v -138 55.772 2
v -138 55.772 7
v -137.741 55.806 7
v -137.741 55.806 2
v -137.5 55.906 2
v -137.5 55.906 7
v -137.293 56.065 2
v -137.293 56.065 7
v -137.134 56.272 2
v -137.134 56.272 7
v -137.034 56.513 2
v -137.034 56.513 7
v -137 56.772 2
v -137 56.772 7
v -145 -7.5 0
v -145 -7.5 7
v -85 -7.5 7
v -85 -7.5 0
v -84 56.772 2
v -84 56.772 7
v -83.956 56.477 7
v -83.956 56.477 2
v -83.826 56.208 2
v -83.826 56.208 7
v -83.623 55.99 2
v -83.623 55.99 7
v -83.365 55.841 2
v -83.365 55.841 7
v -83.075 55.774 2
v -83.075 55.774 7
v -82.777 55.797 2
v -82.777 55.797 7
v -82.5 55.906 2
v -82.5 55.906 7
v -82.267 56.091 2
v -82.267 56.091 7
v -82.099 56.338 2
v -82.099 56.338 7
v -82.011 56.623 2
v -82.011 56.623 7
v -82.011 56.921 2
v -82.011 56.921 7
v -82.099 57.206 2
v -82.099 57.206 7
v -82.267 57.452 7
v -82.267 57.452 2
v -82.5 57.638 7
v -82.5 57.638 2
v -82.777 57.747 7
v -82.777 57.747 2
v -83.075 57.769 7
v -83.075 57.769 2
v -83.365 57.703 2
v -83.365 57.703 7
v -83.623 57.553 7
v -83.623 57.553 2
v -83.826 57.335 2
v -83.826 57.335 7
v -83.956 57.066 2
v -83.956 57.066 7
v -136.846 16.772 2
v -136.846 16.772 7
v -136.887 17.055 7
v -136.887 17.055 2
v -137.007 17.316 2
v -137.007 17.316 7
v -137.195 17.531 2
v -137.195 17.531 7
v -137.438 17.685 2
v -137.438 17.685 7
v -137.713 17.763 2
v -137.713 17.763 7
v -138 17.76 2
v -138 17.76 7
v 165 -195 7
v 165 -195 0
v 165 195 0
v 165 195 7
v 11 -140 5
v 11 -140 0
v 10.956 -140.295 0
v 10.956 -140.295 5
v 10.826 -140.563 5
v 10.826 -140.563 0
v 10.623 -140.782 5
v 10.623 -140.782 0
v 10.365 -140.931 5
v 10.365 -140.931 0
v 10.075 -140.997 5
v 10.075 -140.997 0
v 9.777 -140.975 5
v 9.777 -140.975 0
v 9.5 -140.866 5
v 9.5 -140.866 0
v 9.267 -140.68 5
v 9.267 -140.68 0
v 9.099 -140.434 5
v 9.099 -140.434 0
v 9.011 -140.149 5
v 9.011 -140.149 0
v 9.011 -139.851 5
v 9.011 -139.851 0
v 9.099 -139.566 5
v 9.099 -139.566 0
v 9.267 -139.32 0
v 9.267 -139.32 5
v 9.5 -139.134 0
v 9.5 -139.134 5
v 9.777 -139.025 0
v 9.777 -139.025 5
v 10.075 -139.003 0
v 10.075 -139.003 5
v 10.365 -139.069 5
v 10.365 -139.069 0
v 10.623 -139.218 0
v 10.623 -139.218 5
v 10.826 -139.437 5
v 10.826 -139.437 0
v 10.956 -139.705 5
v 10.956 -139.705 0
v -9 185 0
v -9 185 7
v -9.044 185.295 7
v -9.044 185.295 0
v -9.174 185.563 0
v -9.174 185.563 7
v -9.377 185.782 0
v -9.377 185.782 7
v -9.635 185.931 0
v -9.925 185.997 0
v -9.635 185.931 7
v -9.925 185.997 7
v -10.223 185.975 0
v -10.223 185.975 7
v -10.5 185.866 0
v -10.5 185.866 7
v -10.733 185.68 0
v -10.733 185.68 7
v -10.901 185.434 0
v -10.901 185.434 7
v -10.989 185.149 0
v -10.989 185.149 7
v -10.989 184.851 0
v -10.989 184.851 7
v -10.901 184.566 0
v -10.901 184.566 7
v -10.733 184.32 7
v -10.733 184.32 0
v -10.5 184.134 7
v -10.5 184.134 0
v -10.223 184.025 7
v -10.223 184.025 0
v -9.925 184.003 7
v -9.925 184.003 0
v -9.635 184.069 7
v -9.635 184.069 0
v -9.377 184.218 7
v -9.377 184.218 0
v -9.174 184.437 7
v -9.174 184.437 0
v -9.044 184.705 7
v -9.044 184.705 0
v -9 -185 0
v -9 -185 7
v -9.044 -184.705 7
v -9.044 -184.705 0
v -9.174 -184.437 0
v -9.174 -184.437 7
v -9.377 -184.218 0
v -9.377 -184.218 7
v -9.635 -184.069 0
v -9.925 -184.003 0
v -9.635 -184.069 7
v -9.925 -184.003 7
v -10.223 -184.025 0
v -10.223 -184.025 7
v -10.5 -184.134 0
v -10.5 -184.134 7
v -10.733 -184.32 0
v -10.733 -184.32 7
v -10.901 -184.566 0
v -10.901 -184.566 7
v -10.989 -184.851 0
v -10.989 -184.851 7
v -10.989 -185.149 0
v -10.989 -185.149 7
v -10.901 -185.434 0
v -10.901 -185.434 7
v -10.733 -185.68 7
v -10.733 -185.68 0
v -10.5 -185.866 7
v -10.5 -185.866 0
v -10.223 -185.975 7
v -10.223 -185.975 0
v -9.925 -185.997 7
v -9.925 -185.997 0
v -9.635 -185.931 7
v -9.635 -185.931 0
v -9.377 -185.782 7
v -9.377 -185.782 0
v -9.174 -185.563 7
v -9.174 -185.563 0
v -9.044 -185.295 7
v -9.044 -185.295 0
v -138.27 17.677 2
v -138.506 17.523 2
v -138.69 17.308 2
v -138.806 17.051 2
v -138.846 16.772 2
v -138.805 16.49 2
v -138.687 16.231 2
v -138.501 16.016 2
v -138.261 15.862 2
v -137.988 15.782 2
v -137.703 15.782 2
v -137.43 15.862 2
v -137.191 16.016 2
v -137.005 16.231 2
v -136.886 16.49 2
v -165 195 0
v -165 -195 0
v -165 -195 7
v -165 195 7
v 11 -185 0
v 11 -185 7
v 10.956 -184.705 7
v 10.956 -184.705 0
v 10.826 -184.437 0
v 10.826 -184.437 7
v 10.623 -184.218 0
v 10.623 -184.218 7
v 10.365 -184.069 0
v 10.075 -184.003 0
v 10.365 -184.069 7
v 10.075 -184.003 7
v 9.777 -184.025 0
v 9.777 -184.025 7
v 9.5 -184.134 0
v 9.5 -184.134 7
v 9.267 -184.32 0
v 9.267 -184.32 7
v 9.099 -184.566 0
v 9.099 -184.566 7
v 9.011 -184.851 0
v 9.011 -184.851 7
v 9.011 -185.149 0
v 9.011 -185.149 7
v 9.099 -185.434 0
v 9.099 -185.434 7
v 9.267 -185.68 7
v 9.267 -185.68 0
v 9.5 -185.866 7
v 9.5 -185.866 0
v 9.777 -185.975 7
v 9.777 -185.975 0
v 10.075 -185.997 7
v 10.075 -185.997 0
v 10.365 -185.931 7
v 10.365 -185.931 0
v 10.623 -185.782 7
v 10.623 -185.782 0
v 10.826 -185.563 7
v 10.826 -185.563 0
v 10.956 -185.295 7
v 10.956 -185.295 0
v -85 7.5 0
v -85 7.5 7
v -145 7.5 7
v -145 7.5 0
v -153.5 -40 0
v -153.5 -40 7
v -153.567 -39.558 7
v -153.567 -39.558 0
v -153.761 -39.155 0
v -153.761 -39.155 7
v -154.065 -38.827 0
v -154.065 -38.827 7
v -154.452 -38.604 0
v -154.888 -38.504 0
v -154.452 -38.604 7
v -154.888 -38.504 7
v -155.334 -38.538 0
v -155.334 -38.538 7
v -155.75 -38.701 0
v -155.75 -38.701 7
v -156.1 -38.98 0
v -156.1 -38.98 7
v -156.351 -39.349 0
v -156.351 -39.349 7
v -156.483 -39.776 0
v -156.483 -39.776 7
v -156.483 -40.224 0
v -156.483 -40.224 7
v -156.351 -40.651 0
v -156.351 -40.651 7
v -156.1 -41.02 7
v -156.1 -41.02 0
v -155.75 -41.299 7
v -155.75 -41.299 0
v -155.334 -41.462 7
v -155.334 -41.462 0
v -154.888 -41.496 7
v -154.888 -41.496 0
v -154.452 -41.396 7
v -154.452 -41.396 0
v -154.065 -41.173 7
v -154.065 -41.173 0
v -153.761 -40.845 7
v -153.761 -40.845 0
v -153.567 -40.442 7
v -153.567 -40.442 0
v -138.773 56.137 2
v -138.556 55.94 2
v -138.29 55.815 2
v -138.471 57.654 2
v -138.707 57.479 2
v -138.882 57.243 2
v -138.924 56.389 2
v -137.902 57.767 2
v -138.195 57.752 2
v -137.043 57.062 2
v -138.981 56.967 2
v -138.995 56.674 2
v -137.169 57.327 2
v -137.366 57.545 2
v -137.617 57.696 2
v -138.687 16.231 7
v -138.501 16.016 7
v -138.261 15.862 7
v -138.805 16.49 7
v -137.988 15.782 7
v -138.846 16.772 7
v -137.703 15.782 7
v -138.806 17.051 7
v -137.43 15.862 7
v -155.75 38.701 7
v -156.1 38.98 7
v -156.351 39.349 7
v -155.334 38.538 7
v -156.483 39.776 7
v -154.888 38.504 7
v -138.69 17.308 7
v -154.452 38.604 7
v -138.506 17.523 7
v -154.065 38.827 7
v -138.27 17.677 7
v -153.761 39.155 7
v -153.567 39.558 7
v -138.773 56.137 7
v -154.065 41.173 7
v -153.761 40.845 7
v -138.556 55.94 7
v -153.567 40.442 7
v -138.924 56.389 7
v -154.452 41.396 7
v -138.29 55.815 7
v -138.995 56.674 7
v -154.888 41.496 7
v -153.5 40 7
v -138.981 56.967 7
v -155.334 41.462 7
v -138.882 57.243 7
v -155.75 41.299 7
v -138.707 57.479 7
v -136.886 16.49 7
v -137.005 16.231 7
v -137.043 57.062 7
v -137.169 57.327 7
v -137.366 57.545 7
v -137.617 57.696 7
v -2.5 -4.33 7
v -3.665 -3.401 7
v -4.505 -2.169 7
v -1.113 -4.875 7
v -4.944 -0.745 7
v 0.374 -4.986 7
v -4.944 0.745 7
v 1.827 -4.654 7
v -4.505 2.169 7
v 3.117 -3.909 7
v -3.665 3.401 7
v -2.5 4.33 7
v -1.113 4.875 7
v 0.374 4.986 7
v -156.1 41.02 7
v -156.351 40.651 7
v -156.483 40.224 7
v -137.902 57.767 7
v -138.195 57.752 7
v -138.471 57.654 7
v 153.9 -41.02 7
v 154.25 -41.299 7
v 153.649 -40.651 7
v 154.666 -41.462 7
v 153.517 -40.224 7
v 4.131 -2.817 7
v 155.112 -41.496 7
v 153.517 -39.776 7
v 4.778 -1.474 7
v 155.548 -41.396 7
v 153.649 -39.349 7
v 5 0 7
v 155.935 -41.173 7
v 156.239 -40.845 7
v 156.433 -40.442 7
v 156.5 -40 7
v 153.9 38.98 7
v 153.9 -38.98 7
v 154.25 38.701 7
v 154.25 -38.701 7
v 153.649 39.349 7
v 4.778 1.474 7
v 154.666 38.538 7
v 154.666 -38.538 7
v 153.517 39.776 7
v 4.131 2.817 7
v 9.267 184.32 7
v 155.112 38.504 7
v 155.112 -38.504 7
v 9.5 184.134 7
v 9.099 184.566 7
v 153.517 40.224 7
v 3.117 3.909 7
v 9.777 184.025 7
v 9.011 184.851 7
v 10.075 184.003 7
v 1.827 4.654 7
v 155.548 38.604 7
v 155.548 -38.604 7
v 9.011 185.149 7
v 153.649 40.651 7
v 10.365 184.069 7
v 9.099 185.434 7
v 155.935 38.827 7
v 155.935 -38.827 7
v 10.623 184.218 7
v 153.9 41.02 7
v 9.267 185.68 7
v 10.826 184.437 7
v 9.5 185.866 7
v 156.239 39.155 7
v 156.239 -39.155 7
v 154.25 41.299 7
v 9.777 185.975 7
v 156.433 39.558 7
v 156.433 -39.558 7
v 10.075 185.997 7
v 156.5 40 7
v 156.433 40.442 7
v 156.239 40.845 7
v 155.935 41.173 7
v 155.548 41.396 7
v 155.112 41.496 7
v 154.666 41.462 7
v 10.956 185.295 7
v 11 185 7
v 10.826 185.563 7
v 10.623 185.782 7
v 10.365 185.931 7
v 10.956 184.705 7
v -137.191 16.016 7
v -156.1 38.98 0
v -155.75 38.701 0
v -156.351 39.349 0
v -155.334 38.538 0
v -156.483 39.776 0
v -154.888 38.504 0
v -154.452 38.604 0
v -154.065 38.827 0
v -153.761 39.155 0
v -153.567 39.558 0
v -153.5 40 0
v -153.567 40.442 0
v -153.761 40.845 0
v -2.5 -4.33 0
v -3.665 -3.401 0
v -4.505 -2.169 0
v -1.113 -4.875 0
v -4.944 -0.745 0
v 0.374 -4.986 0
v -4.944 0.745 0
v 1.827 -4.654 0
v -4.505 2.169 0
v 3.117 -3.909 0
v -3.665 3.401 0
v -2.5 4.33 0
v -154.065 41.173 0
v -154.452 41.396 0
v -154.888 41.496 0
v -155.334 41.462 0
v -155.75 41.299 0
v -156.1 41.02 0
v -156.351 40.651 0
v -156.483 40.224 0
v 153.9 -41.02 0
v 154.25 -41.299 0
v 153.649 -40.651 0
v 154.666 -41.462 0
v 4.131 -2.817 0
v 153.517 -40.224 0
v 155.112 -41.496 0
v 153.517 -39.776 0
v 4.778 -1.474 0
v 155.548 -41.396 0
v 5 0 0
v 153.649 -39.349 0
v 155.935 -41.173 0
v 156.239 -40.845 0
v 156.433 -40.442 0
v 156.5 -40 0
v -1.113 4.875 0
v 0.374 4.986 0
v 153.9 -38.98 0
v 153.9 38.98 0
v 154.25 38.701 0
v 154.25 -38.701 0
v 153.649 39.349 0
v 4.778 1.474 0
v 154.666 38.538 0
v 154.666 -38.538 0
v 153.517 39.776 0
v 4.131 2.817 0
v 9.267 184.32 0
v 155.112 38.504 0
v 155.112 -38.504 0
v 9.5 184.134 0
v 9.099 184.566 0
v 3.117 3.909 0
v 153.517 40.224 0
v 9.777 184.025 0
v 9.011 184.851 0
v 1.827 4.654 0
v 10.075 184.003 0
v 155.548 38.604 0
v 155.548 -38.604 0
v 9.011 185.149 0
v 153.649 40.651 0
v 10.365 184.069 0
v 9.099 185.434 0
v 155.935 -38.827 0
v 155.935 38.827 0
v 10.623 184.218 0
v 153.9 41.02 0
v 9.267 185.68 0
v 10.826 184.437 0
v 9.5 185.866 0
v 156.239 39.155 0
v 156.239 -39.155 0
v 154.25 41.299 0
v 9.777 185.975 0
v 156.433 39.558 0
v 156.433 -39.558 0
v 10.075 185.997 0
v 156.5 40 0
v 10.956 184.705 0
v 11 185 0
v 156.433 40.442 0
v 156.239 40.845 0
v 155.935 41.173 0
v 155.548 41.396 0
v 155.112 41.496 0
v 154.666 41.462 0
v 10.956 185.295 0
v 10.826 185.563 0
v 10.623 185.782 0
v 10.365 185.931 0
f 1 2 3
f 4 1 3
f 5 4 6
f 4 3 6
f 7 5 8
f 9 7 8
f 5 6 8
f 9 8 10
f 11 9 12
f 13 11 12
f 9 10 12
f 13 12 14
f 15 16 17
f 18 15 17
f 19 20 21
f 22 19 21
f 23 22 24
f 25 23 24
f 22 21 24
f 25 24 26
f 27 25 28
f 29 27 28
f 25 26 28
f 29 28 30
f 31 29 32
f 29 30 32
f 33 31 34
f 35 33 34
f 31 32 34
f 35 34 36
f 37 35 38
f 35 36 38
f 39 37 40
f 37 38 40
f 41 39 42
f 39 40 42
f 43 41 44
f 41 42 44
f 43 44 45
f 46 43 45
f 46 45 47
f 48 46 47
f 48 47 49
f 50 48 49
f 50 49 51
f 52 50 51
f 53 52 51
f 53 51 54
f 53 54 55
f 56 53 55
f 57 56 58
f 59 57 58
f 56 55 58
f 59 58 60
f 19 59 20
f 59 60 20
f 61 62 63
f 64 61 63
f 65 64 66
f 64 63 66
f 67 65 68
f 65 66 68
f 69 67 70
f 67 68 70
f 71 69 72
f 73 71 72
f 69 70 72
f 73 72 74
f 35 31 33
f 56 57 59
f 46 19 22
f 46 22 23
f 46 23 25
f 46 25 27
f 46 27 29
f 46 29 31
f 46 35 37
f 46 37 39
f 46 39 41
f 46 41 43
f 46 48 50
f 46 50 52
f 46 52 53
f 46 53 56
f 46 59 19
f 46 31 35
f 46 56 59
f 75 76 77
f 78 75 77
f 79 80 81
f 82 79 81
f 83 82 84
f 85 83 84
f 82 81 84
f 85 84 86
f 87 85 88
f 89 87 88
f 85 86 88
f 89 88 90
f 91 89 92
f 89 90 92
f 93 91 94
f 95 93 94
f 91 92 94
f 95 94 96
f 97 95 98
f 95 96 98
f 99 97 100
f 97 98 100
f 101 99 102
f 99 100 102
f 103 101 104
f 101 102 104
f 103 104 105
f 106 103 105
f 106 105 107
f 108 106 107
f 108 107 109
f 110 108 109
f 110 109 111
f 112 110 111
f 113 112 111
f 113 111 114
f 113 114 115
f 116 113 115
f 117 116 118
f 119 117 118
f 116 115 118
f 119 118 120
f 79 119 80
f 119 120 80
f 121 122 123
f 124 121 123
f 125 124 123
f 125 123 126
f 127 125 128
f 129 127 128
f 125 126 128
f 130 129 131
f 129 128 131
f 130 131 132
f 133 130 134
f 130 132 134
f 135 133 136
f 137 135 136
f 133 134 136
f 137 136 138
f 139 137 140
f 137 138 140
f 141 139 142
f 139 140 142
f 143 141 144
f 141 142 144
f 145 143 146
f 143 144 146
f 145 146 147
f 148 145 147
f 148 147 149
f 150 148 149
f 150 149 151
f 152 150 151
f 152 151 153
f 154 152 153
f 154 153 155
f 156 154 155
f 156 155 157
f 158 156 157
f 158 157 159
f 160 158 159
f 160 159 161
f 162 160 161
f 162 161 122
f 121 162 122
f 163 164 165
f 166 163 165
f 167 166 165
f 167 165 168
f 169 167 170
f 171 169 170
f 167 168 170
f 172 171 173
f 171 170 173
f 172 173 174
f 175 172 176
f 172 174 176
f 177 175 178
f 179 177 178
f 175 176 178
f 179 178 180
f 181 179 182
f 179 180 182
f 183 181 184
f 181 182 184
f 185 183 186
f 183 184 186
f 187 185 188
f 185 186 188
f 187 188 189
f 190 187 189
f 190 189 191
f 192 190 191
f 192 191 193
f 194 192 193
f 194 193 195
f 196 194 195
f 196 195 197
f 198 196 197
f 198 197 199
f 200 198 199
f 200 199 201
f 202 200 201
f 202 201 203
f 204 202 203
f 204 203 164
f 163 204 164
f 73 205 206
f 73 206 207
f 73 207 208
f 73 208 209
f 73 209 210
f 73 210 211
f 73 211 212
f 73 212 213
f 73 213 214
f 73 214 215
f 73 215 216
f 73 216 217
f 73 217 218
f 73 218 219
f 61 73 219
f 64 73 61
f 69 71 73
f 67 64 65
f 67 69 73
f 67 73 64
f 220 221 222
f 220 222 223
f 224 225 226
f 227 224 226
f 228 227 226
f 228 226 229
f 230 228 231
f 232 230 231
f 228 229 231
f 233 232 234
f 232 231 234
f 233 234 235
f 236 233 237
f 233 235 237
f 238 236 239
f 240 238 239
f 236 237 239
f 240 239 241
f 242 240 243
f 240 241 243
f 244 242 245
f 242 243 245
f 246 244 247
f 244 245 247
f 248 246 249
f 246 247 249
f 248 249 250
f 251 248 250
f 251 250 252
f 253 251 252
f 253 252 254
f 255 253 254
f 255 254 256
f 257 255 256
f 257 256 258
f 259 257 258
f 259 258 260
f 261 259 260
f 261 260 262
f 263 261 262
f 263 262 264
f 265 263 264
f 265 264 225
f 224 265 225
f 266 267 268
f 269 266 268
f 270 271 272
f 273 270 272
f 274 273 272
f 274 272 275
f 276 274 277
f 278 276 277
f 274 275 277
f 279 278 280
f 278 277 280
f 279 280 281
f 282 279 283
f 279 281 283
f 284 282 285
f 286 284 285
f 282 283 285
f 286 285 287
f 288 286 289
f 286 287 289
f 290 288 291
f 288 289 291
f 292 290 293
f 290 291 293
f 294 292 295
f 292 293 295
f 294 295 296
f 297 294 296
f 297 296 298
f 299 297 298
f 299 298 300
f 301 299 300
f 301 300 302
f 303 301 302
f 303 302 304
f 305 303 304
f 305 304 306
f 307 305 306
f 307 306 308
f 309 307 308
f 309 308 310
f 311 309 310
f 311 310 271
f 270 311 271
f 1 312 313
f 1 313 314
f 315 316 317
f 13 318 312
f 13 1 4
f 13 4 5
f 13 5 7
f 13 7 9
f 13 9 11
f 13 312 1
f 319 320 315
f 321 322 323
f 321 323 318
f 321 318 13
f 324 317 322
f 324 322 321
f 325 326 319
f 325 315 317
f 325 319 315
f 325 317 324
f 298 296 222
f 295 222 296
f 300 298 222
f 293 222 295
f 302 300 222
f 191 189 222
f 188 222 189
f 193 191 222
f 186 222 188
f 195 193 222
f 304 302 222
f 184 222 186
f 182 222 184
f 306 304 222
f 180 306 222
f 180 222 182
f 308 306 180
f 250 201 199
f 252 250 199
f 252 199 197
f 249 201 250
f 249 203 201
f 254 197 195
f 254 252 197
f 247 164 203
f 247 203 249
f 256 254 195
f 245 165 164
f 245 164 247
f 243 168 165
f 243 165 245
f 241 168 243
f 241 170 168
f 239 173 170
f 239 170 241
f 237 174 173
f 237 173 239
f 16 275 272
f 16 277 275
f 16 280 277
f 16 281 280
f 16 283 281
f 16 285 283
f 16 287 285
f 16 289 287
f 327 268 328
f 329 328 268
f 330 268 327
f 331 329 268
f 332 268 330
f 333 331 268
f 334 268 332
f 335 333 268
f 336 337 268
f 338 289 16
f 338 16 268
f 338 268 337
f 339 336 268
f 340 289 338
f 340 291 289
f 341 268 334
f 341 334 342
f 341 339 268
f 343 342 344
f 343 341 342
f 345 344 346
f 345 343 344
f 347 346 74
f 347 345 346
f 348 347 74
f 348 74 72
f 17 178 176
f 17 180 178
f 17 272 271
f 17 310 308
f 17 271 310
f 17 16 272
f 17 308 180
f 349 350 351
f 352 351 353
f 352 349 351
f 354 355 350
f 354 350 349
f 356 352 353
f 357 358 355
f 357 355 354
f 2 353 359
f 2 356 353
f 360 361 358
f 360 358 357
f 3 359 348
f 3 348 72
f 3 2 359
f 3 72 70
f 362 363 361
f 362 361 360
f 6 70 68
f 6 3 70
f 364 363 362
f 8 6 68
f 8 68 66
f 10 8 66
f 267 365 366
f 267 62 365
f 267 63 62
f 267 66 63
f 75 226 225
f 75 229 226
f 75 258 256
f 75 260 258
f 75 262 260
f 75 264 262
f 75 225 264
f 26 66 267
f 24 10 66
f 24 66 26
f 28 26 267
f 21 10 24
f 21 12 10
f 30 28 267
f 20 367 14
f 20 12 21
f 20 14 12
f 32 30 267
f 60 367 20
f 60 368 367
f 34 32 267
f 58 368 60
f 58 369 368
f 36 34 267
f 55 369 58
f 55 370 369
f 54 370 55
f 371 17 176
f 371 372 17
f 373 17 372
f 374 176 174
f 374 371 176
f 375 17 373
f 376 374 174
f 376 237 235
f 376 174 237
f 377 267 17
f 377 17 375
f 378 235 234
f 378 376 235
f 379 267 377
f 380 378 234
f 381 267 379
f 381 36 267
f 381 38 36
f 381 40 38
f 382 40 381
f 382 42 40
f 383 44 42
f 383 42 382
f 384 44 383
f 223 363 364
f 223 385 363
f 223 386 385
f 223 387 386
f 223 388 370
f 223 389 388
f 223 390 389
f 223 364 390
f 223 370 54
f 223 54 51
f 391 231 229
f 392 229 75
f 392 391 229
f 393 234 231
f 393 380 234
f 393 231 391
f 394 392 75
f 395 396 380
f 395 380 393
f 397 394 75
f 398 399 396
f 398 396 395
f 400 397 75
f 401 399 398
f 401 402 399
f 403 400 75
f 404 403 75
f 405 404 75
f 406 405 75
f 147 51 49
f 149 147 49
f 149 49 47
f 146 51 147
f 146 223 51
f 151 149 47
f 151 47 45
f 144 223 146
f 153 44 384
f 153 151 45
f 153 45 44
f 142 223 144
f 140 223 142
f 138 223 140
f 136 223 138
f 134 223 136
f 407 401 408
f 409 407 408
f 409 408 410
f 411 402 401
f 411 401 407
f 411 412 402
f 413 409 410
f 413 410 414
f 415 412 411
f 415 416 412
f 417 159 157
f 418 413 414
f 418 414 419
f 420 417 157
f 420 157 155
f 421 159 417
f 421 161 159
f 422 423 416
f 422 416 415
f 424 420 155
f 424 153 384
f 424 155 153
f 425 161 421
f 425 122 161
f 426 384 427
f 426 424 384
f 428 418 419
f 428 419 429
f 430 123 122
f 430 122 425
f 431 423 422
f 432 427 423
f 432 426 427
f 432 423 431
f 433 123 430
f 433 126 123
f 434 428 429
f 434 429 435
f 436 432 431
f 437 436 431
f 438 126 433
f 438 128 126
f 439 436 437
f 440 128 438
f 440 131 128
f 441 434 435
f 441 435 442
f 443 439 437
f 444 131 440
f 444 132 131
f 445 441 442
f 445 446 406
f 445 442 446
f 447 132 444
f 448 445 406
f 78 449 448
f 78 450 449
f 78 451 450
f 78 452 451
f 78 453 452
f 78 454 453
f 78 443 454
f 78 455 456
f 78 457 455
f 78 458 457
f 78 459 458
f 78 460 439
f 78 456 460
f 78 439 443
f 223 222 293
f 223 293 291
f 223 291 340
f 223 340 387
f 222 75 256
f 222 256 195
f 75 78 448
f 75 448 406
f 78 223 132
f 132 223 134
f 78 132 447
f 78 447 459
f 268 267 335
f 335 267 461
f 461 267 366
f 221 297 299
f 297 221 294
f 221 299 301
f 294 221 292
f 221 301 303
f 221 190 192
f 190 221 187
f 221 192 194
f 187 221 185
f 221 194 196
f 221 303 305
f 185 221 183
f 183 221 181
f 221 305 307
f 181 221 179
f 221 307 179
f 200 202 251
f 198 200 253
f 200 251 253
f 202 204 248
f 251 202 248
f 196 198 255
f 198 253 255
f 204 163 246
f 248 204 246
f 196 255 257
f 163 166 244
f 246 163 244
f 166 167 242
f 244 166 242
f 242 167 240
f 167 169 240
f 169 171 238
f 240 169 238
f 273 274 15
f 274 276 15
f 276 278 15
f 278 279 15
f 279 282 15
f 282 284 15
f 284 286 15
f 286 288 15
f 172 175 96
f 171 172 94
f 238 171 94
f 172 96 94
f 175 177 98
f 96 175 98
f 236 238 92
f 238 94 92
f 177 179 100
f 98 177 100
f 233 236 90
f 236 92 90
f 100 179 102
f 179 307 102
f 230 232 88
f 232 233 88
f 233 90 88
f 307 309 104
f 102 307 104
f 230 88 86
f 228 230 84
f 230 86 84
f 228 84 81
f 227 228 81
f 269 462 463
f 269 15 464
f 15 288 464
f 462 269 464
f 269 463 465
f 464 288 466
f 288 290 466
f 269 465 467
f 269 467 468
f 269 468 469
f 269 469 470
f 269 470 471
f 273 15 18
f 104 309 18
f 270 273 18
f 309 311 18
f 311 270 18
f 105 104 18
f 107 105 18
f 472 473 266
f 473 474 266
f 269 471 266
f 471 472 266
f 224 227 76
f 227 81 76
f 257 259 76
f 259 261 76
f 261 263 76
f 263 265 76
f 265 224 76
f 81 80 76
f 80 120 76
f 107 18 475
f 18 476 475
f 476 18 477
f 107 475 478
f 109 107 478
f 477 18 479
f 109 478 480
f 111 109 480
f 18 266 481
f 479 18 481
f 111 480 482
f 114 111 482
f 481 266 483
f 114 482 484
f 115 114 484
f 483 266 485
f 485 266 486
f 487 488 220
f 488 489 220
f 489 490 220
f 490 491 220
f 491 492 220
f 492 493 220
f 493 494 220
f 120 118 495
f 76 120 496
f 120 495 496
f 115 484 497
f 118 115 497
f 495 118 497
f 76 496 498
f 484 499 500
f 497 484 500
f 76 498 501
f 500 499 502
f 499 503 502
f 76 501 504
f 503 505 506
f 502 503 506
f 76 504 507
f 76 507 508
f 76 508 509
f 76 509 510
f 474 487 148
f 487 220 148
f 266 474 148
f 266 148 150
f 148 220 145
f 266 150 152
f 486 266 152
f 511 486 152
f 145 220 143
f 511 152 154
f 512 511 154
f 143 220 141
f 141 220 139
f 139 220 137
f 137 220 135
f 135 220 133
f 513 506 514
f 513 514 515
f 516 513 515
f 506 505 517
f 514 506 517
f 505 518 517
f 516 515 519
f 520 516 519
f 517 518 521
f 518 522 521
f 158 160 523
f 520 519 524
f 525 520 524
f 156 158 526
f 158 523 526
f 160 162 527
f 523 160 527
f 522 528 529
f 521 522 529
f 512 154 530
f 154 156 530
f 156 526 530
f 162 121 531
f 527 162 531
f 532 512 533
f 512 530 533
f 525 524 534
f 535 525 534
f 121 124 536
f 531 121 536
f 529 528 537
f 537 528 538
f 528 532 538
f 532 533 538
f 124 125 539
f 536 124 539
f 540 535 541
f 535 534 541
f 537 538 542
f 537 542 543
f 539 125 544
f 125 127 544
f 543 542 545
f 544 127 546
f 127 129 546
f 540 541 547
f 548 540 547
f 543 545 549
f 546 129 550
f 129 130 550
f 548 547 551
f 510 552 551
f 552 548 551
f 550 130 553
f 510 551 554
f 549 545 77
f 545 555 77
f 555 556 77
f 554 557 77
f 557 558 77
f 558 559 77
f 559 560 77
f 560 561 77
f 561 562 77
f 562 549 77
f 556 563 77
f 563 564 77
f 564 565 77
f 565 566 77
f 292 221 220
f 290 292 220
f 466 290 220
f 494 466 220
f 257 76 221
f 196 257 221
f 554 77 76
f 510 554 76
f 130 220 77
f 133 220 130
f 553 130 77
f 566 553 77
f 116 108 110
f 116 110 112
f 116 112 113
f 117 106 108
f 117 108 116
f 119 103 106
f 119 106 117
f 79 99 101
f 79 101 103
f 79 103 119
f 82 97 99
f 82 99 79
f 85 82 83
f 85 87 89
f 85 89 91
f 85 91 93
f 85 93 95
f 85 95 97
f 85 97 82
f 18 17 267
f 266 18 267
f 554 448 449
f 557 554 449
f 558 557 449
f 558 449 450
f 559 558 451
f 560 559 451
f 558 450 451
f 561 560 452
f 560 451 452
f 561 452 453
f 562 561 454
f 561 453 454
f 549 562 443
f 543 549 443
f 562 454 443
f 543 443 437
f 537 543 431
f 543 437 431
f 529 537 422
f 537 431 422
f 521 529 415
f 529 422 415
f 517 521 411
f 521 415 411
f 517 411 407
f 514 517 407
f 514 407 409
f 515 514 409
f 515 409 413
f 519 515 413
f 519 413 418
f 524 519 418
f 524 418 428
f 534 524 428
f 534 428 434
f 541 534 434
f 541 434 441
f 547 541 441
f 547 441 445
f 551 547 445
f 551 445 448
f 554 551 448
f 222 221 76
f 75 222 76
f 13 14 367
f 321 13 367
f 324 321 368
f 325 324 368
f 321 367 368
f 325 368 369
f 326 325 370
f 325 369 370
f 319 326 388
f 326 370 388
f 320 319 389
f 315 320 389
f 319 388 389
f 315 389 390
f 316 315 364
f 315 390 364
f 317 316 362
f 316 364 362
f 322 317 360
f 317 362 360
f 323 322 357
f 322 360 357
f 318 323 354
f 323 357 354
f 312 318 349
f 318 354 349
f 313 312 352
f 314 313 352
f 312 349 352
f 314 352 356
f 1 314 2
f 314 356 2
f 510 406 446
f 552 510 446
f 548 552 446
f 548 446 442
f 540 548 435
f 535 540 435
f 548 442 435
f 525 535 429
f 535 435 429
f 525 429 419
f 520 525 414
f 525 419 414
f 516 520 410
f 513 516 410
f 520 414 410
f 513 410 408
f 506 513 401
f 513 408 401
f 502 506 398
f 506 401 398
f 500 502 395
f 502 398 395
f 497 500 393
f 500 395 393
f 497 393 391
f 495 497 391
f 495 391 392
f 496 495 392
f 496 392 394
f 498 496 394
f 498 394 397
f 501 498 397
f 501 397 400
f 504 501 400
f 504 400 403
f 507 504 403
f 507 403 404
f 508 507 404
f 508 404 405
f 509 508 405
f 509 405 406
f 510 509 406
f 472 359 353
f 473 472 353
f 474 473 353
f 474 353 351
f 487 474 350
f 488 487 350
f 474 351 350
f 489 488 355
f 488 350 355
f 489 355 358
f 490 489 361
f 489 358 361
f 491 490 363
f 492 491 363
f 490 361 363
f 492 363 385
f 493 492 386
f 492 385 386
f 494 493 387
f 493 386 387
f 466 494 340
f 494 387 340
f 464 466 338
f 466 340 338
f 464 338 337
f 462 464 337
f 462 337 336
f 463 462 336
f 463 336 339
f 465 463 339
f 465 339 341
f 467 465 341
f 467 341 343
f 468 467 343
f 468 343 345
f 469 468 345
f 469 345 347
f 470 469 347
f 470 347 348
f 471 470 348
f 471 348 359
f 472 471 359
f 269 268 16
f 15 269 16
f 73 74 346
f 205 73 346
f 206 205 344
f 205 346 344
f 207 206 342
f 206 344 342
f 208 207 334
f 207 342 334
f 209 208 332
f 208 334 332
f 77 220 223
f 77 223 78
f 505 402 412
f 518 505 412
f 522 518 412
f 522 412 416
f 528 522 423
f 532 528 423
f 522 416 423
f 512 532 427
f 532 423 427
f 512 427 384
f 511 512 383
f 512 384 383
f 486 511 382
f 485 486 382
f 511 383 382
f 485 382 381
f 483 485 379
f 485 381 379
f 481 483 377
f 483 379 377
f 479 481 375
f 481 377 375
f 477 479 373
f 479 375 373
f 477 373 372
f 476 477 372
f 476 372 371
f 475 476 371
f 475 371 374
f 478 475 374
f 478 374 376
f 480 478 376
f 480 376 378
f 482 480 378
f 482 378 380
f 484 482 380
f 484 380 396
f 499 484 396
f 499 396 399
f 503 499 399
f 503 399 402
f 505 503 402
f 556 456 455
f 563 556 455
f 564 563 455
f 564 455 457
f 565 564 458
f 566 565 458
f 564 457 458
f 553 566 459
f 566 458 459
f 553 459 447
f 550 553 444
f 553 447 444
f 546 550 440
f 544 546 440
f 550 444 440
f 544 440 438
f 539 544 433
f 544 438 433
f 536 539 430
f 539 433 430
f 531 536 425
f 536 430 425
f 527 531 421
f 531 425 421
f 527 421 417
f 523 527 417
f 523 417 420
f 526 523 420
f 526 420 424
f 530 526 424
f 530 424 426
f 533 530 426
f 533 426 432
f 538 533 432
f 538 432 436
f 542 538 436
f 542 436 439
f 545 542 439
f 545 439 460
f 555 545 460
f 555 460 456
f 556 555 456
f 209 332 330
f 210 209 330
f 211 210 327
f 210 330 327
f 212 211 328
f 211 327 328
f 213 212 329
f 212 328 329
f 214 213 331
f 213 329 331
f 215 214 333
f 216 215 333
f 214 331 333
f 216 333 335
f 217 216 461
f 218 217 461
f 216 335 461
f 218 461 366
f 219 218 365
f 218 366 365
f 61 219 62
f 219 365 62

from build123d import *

# Parameters (mm, degrees)
F0_W      = 330
F0_H      = 390
F1_DEPTH  = 7
F2_R      = 1.5
F3_DEPTH  = 25
F4_R      = 1.5
F5_DEPTH  = 25
F7_DEPTH  = 5
F9_DEPTH  = 25
F10_R     = 5
F11_DEPTH = 25
F12_R     = 1
F13_DEPTH = 50
F14_R     = 1
F15_DEPTH = 5


with BuildPart() as f1:
    # F0 (on Top) → F1 (new body)
    with BuildSketch(Plane.XY):
        Rectangle(F0_W, F0_H)
    extrude(amount=F1_DEPTH)

    # F2 (on face) → F3 (cut)
    with BuildSketch(Plane.XY.offset(7)):
        with Locations((-155, 40)):
            Circle(F2_R)
        with Locations((-155, -40)):
            Circle(F2_R)
    extrude(amount=-F3_DEPTH, mode=Mode.SUBTRACT)

    # F4 (on face) → F5 (cut)
    with BuildSketch(Plane.XY.offset(7)):
        with Locations((155, 40)):
            Circle(F4_R)
        with Locations((155, -40)):
            Circle(F4_R)
    extrude(amount=-F5_DEPTH, mode=Mode.SUBTRACT)

    # F6 (on face) → F7 (cut)
    with BuildSketch(Plane.XY.offset(7)):
        with BuildLine():
            Line((-138, 56.771628), (-137, 56.771628))
            ThreePointArc((-137, 56.771628), (-138.707107, 57.478734), (-138, 55.771628))
            Line((-138, 55.771628), (-138, 56.771628))
        make_face()
        with BuildLine():
            ThreePointArc((-136.845755, 16.771628), (-137.195464, 17.531314), (-138, 17.75966))
            Line((-138, 17.75966), (-138, 16.771628))
            Line((-138, 16.771628), (-138.845755, 16.771628))
            ThreePointArc((-138.845755, 16.771628), (-137.845755, 15.771628), (-136.845755, 16.771628))
        make_face()
        with BuildLine():
            Line((-138, 16.771628), (-138, 17.75966))
            ThreePointArc((-138, 17.75966), (-138.605441, 17.421918), (-138.845755, 16.771628))
            Line((-138.845755, 16.771628), (-138, 16.771628))
        make_face()
        with BuildLine():
            ThreePointArc((-138, 55.771628), (-137.292893, 56.064521), (-137, 56.771628))
            Line((-137, 56.771628), (-138, 56.771628))
            Line((-138, 56.771628), (-138, 55.771628))
        make_face()
        with BuildLine():
            ThreePointArc((-82, 56.771628), (-83, 57.771628), (-84, 56.771628))
            ThreePointArc((-84, 56.771628), (-83, 55.771628), (-82, 56.771628))
        make_face()
    extrude(amount=-F7_DEPTH, mode=Mode.SUBTRACT)

    # F8 (on face) → F9 (cut)
    with BuildSketch(Plane.XY.offset(7)):
        Polygon((-145, 7.5), (-145, 0), (-145, -7.5), (-85, -7.5), (-85, 7.5), align=None)
    extrude(amount=-F9_DEPTH, mode=Mode.SUBTRACT)

    # F10 (on face) → F11 (cut)
    with BuildSketch(Plane.XY.offset(7)):
        Circle(F10_R)
    extrude(amount=-F11_DEPTH, mode=Mode.SUBTRACT)

    # F12 (on face) → F13 (cut)
    with BuildSketch(Plane.XY.offset(7)):
        with Locations((10, 185)):
            Circle(F12_R)
        with Locations((-10, 185)):
            Circle(F12_R)
        with Locations((10, -185)):
            Circle(F12_R)
        with Locations((-10, -185)):
            Circle(F12_R)
    extrude(amount=-F13_DEPTH, mode=Mode.SUBTRACT)

    # F14 (on face) → F15 (cut)
    with BuildSketch(Plane(origin=(0, 0, 0), x_dir=(1, 0, 0), z_dir=(0, 0, -1))):
        with Locations((10, 140)):
            Circle(F14_R)
    extrude(amount=-F15_DEPTH, mode=Mode.SUBTRACT)


solid = f1.part
